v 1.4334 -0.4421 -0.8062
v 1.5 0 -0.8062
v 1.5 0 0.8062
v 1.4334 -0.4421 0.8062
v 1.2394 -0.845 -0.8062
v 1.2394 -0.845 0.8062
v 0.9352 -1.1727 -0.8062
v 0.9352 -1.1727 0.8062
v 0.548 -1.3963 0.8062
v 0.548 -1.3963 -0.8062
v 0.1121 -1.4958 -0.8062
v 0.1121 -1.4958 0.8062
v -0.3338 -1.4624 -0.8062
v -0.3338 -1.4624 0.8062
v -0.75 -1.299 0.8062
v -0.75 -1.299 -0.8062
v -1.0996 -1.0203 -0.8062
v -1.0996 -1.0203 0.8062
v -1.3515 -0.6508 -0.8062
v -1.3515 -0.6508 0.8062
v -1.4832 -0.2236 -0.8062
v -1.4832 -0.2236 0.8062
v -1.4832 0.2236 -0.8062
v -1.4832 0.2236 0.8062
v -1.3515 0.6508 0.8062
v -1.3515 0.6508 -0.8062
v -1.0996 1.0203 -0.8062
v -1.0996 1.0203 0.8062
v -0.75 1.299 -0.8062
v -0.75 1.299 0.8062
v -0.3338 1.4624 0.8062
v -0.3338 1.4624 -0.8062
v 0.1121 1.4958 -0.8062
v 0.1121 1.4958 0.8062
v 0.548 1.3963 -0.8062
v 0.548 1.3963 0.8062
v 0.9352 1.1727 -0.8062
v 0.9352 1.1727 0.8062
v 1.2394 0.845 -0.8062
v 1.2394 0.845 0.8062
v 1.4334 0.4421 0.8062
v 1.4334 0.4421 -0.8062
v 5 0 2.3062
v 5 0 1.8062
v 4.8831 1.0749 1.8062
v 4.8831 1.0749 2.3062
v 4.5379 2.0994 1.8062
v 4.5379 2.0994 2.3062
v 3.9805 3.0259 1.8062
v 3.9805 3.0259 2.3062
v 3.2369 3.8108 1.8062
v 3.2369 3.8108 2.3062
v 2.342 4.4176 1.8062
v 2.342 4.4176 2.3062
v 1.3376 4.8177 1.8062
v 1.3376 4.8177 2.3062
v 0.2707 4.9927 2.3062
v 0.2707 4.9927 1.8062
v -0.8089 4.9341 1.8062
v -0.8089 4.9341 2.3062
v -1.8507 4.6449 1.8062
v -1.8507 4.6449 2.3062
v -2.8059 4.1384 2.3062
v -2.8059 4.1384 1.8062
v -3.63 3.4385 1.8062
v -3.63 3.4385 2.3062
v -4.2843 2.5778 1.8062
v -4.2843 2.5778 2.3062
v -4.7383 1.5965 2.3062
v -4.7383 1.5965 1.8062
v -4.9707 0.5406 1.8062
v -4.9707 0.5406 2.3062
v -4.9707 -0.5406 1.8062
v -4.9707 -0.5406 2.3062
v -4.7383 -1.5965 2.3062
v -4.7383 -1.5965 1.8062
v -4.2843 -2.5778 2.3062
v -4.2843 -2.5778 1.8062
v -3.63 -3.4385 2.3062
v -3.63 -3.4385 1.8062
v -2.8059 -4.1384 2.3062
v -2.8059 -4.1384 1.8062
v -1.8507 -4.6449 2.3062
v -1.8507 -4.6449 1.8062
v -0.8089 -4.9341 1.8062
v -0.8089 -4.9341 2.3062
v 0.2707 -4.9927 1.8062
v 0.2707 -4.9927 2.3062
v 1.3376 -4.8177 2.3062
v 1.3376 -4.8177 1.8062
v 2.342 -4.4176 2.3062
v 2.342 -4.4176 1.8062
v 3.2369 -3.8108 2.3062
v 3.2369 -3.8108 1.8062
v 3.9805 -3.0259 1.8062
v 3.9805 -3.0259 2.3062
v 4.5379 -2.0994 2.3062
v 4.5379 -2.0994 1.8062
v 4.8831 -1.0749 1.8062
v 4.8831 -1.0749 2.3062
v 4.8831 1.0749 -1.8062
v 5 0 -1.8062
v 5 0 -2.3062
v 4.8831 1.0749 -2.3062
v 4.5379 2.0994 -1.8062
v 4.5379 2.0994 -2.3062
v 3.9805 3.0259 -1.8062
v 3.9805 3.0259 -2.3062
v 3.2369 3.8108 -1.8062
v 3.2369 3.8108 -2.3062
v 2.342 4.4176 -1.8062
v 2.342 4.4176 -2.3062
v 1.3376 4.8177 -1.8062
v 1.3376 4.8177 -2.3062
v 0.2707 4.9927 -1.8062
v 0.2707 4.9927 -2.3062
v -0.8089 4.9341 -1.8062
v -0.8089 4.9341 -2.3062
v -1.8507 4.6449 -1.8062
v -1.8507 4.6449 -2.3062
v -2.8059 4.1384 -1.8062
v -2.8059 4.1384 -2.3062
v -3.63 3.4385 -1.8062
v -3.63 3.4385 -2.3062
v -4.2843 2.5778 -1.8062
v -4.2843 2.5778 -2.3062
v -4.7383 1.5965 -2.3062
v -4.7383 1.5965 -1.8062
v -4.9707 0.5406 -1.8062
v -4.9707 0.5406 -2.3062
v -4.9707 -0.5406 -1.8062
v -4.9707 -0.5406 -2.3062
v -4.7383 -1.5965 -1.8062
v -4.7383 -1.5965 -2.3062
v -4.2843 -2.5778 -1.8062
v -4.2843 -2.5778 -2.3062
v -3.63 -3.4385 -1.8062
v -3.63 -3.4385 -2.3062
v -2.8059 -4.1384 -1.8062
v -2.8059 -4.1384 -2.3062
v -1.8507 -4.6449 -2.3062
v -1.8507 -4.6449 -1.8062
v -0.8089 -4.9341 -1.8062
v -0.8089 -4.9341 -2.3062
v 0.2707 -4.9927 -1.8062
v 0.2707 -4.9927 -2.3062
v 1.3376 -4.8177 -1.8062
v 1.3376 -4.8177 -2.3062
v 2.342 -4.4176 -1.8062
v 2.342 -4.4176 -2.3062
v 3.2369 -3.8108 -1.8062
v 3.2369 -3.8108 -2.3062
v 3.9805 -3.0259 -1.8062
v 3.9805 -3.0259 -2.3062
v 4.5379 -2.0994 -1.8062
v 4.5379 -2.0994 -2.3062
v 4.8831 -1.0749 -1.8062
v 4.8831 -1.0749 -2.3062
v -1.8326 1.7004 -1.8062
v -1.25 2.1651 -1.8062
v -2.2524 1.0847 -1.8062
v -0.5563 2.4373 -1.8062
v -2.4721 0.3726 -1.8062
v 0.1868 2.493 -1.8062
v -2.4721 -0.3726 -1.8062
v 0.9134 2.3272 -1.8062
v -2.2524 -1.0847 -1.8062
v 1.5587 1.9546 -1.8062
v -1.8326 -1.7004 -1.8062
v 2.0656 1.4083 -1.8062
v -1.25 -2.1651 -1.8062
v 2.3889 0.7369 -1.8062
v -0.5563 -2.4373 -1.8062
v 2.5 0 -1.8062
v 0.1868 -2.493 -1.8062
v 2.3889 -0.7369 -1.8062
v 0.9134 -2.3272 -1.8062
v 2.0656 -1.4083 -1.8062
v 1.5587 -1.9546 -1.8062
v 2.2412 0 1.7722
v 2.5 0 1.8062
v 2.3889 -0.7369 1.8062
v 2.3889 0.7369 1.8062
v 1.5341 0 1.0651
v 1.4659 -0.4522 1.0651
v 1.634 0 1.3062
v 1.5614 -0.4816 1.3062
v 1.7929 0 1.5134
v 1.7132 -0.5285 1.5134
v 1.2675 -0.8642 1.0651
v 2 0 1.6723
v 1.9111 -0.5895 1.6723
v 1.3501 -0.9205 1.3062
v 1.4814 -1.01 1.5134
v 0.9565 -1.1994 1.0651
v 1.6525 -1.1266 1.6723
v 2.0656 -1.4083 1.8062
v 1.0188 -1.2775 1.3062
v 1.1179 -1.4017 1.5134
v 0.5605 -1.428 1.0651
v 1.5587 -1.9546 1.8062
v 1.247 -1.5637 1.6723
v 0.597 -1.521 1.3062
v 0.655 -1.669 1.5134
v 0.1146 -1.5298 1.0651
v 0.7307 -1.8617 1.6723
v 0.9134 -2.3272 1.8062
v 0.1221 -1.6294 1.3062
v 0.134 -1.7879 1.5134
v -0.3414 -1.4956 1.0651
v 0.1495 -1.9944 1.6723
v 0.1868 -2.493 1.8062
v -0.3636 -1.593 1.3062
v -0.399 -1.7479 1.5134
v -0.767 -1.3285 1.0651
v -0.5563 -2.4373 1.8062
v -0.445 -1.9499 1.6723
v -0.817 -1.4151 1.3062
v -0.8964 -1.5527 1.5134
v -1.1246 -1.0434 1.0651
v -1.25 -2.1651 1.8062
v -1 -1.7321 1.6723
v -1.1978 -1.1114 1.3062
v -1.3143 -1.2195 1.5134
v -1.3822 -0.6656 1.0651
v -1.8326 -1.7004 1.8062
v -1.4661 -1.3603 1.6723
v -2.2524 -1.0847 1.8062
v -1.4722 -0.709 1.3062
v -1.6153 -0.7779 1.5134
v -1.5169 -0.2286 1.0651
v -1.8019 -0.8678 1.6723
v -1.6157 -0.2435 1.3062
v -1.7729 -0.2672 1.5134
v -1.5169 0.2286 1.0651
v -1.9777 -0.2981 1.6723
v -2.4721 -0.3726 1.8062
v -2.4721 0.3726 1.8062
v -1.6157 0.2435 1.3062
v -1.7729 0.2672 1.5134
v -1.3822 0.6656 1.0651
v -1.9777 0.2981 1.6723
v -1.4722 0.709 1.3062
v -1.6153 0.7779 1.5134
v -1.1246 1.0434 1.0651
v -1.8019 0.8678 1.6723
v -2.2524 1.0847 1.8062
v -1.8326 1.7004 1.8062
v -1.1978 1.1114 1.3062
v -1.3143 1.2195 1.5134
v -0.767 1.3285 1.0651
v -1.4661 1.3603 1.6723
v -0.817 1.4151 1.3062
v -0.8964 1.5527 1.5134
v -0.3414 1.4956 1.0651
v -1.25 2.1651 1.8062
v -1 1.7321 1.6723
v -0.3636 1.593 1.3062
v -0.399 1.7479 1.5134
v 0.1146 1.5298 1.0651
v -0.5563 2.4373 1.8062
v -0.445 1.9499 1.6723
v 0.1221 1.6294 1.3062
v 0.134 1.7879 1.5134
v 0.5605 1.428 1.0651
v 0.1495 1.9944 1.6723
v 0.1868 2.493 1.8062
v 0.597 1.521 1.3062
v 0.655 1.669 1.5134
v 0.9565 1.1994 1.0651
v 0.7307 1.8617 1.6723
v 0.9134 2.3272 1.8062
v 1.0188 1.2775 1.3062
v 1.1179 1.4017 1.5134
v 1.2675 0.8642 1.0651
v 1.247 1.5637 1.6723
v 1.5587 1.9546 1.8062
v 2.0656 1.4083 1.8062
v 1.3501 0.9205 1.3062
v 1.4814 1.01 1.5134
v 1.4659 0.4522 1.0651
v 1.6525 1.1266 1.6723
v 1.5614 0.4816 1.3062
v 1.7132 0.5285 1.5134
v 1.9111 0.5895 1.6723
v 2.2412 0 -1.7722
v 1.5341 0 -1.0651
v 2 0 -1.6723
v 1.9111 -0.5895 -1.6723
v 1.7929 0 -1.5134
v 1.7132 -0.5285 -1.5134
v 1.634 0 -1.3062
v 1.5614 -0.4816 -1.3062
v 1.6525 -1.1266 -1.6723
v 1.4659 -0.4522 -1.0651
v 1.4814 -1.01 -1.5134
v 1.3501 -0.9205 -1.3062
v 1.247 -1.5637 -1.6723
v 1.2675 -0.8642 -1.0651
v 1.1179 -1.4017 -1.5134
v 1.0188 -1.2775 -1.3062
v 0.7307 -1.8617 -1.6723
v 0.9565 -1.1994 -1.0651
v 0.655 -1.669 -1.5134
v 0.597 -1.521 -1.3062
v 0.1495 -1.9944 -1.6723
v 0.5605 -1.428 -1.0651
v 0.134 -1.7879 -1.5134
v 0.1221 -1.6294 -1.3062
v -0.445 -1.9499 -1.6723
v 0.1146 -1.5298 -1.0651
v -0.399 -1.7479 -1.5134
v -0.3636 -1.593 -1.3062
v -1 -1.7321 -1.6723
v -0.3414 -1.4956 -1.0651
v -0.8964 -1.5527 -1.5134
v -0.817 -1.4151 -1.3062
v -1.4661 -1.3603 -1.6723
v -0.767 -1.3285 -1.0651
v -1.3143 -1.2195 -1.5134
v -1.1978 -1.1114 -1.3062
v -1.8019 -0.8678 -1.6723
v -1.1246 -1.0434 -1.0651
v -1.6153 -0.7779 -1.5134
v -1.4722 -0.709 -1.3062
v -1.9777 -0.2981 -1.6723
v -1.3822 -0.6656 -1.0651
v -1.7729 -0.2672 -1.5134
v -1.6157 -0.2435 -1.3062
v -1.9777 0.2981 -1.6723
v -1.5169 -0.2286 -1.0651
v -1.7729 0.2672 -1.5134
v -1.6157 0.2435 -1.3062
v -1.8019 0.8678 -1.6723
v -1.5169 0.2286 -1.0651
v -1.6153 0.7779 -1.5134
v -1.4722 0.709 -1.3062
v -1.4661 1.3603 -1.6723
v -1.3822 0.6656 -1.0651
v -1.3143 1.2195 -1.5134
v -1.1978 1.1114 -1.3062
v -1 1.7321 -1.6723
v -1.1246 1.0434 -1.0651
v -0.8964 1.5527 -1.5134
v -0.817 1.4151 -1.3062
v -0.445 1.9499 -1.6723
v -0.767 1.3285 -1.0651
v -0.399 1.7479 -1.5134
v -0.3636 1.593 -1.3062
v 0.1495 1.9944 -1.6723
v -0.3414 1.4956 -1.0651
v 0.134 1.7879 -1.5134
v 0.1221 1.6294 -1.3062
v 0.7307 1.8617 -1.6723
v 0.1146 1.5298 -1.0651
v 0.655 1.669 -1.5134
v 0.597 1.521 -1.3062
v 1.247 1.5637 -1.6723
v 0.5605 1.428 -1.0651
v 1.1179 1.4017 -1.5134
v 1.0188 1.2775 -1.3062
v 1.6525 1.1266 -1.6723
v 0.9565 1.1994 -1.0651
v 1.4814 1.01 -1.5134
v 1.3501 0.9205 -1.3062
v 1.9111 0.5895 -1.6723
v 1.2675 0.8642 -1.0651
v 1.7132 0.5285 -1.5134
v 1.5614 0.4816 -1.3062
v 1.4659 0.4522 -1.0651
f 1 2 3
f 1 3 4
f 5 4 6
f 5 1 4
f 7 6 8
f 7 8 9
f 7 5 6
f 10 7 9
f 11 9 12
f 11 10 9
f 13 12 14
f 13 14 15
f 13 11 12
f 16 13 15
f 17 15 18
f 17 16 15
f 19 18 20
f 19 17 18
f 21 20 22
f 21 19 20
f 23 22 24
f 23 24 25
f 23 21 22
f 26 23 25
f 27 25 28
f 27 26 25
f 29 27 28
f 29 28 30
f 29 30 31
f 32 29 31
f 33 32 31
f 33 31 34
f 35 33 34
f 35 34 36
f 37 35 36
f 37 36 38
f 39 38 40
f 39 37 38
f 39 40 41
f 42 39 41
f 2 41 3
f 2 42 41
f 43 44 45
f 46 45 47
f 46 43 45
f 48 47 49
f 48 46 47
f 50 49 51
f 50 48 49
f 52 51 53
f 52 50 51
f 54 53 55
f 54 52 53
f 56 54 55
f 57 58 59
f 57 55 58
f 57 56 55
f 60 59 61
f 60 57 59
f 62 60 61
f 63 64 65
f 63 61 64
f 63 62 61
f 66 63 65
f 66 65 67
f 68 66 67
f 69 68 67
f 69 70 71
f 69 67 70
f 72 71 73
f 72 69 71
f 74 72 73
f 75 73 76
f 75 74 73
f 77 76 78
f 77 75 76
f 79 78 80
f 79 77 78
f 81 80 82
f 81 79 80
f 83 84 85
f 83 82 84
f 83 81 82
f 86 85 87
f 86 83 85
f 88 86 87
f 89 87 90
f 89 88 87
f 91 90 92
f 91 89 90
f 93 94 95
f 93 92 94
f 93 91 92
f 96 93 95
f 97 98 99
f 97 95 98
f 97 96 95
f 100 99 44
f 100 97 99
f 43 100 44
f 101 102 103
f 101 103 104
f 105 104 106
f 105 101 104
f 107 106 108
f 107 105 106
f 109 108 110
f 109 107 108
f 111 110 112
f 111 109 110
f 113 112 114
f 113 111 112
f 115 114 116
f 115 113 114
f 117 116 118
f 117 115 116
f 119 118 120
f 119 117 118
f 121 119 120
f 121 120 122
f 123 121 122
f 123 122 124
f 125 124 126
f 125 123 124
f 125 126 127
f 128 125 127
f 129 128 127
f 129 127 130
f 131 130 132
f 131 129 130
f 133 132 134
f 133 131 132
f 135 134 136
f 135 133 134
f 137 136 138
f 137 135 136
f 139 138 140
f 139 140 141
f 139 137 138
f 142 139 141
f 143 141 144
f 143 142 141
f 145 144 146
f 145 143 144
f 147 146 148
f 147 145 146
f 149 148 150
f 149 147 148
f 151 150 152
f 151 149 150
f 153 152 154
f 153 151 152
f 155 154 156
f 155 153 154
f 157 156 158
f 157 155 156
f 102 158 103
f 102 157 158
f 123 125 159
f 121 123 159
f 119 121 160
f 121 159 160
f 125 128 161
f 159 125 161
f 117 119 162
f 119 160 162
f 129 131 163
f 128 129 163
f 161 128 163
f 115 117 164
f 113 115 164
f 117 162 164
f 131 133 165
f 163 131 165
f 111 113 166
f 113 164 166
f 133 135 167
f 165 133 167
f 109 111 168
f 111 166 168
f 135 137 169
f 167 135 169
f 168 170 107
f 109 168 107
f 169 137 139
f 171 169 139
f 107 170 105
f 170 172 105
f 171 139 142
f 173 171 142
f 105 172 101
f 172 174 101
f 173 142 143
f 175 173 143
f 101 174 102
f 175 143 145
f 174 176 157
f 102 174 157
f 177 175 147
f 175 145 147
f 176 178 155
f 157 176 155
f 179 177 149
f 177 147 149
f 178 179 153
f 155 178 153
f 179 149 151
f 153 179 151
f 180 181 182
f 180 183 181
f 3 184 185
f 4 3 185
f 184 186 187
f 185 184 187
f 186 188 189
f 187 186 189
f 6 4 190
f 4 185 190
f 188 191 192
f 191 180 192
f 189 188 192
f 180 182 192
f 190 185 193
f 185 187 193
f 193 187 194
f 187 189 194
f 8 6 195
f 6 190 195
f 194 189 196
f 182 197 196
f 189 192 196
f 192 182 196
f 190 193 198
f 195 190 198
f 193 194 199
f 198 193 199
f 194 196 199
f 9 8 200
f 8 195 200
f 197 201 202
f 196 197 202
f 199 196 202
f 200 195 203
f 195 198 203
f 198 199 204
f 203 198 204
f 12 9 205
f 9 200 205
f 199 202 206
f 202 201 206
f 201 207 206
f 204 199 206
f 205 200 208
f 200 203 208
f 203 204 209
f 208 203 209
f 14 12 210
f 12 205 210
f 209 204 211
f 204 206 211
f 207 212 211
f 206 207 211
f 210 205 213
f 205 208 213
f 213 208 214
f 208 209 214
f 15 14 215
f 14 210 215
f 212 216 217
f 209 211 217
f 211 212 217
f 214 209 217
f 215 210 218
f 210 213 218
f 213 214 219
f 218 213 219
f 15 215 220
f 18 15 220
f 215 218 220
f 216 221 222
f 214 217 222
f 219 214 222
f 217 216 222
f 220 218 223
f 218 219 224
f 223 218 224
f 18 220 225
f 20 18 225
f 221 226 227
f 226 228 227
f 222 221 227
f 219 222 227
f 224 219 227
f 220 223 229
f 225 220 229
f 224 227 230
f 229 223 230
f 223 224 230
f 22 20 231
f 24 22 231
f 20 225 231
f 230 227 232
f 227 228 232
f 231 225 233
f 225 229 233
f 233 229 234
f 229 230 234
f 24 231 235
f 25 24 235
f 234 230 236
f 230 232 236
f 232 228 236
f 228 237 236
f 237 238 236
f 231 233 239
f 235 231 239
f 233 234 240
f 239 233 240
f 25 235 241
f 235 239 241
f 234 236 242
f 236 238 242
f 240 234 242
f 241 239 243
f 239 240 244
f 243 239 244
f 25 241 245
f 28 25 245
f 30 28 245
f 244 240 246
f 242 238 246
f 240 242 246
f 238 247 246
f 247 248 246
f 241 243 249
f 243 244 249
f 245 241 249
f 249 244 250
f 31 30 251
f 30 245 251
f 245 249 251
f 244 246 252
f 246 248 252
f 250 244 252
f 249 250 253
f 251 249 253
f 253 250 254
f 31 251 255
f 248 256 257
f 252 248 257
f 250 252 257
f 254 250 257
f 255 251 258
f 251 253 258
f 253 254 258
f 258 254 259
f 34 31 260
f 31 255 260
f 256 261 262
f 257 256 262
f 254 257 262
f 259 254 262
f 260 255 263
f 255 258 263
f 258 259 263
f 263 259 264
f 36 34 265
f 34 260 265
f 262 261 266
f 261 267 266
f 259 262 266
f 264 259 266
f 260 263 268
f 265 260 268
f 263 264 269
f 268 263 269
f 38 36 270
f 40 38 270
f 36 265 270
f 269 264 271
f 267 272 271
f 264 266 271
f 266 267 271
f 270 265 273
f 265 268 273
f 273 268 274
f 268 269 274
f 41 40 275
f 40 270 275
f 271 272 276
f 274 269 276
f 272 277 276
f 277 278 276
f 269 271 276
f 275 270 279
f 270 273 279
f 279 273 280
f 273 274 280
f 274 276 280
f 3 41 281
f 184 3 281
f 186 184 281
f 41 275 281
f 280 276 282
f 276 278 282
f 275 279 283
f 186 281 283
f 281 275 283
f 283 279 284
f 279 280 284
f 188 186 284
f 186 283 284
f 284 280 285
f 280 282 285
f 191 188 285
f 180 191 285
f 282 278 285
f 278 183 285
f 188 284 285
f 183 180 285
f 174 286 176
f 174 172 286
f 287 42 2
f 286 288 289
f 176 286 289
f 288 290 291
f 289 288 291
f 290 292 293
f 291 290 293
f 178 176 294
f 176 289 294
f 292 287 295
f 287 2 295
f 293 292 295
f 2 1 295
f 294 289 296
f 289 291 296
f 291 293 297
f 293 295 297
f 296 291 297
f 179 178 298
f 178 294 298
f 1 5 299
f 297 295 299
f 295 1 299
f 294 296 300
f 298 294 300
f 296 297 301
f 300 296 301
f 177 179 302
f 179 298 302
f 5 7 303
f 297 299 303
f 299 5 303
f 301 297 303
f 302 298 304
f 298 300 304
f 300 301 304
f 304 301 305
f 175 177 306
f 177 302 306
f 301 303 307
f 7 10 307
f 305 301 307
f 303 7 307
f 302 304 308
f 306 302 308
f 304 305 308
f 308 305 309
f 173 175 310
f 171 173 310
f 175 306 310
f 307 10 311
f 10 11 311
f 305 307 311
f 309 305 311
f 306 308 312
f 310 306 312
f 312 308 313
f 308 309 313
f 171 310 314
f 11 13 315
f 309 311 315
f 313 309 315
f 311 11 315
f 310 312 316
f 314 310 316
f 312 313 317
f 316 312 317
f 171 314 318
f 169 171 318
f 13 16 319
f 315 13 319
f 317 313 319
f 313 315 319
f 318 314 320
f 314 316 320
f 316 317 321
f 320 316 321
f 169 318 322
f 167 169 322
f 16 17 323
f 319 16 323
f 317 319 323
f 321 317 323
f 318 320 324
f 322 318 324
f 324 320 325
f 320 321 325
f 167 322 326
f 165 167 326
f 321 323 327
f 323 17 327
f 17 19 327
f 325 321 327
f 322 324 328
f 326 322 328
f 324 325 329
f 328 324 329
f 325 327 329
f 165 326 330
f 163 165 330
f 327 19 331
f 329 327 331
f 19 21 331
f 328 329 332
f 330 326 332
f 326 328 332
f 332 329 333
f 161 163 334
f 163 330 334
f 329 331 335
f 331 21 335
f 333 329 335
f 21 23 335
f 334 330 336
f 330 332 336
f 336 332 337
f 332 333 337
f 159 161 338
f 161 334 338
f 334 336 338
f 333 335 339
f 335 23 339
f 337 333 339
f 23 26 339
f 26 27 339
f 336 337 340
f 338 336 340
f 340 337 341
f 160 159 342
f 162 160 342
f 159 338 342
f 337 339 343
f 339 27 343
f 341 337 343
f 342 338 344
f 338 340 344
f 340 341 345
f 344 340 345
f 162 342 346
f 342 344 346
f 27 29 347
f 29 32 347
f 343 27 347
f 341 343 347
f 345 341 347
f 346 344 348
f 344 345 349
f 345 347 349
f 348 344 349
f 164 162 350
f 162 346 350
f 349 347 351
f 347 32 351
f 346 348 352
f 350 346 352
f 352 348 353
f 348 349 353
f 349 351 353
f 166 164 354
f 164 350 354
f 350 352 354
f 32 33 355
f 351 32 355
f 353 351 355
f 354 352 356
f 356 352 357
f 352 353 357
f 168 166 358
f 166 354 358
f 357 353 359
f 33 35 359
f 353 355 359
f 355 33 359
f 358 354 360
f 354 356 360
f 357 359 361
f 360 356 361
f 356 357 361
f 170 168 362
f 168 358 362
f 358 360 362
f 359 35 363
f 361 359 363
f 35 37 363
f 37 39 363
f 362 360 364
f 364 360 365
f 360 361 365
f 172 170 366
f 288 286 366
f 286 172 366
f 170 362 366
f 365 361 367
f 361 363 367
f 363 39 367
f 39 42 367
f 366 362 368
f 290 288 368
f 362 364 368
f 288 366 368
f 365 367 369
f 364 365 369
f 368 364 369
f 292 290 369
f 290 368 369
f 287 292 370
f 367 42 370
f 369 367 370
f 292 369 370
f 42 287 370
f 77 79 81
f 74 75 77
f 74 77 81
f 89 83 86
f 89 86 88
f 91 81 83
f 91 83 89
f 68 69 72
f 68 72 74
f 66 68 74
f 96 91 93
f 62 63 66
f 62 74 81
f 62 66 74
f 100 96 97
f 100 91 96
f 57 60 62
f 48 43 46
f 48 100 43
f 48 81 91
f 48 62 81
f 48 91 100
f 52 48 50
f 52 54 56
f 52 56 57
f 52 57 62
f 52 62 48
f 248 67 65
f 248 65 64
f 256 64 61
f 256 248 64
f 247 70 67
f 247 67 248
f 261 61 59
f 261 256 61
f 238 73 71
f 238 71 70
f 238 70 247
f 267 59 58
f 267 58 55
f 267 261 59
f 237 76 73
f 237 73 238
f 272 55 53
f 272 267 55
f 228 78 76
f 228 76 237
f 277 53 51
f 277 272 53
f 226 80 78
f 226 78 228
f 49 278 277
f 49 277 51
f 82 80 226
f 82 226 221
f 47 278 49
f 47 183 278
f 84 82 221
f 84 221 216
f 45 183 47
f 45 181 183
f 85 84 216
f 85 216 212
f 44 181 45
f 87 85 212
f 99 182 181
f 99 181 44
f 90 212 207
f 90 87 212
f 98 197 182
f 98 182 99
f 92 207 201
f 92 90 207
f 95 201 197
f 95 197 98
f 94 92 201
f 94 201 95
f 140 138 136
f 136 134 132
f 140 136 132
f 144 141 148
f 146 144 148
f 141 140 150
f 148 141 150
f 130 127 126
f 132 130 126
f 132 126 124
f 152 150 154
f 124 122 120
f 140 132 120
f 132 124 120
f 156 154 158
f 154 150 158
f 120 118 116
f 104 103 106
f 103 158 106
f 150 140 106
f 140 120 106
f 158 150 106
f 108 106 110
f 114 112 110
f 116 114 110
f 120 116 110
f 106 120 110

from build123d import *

# Parameters (mm, degrees)
SKETCH7_R      = 5
EXTRUDE5_DEPTH = 2.30625
SKETCH8_W      = 3.5
SKETCH8_H      = 3.6125
FILLET1_R      = 1


with BuildPart() as part:
    # Sketch7 → Extrude5 (new body, symmetric)
    with BuildSketch(Plane.XY):
        Circle(SKETCH7_R)
    extrude(amount=EXTRUDE5_DEPTH, both=True)

    # Sketch8 → Cut-Revolve1 (revolve, cut)
    with BuildSketch(Plane(origin=(0, 0, 0), x_dir=(1, 0, 0), z_dir=(0, 1, 0)), mode=Mode.PRIVATE) as cut_revolve1_sk:
        with Locations((-3.25, 0)):
            Rectangle(SKETCH8_W, SKETCH8_H)
    revolve(cut_revolve1_sk.sketch.rotate(Axis((0, 0, 0), (0, 0, -1)), 180), axis=Axis((0, 0, 0), (0, 0, -1)), mode=Mode.SUBTRACT)  # turned: the seam where the file's is

    # Fillet1
    fillet1_edges = [part.edges().sort_by_distance(p)[0] for p in [
        (-1.5, 0, 1.80625),
        (-1.5, 0, -1.80625),
    ]]
    fillet(fillet1_edges, radius=FILLET1_R)


solid = part.part
